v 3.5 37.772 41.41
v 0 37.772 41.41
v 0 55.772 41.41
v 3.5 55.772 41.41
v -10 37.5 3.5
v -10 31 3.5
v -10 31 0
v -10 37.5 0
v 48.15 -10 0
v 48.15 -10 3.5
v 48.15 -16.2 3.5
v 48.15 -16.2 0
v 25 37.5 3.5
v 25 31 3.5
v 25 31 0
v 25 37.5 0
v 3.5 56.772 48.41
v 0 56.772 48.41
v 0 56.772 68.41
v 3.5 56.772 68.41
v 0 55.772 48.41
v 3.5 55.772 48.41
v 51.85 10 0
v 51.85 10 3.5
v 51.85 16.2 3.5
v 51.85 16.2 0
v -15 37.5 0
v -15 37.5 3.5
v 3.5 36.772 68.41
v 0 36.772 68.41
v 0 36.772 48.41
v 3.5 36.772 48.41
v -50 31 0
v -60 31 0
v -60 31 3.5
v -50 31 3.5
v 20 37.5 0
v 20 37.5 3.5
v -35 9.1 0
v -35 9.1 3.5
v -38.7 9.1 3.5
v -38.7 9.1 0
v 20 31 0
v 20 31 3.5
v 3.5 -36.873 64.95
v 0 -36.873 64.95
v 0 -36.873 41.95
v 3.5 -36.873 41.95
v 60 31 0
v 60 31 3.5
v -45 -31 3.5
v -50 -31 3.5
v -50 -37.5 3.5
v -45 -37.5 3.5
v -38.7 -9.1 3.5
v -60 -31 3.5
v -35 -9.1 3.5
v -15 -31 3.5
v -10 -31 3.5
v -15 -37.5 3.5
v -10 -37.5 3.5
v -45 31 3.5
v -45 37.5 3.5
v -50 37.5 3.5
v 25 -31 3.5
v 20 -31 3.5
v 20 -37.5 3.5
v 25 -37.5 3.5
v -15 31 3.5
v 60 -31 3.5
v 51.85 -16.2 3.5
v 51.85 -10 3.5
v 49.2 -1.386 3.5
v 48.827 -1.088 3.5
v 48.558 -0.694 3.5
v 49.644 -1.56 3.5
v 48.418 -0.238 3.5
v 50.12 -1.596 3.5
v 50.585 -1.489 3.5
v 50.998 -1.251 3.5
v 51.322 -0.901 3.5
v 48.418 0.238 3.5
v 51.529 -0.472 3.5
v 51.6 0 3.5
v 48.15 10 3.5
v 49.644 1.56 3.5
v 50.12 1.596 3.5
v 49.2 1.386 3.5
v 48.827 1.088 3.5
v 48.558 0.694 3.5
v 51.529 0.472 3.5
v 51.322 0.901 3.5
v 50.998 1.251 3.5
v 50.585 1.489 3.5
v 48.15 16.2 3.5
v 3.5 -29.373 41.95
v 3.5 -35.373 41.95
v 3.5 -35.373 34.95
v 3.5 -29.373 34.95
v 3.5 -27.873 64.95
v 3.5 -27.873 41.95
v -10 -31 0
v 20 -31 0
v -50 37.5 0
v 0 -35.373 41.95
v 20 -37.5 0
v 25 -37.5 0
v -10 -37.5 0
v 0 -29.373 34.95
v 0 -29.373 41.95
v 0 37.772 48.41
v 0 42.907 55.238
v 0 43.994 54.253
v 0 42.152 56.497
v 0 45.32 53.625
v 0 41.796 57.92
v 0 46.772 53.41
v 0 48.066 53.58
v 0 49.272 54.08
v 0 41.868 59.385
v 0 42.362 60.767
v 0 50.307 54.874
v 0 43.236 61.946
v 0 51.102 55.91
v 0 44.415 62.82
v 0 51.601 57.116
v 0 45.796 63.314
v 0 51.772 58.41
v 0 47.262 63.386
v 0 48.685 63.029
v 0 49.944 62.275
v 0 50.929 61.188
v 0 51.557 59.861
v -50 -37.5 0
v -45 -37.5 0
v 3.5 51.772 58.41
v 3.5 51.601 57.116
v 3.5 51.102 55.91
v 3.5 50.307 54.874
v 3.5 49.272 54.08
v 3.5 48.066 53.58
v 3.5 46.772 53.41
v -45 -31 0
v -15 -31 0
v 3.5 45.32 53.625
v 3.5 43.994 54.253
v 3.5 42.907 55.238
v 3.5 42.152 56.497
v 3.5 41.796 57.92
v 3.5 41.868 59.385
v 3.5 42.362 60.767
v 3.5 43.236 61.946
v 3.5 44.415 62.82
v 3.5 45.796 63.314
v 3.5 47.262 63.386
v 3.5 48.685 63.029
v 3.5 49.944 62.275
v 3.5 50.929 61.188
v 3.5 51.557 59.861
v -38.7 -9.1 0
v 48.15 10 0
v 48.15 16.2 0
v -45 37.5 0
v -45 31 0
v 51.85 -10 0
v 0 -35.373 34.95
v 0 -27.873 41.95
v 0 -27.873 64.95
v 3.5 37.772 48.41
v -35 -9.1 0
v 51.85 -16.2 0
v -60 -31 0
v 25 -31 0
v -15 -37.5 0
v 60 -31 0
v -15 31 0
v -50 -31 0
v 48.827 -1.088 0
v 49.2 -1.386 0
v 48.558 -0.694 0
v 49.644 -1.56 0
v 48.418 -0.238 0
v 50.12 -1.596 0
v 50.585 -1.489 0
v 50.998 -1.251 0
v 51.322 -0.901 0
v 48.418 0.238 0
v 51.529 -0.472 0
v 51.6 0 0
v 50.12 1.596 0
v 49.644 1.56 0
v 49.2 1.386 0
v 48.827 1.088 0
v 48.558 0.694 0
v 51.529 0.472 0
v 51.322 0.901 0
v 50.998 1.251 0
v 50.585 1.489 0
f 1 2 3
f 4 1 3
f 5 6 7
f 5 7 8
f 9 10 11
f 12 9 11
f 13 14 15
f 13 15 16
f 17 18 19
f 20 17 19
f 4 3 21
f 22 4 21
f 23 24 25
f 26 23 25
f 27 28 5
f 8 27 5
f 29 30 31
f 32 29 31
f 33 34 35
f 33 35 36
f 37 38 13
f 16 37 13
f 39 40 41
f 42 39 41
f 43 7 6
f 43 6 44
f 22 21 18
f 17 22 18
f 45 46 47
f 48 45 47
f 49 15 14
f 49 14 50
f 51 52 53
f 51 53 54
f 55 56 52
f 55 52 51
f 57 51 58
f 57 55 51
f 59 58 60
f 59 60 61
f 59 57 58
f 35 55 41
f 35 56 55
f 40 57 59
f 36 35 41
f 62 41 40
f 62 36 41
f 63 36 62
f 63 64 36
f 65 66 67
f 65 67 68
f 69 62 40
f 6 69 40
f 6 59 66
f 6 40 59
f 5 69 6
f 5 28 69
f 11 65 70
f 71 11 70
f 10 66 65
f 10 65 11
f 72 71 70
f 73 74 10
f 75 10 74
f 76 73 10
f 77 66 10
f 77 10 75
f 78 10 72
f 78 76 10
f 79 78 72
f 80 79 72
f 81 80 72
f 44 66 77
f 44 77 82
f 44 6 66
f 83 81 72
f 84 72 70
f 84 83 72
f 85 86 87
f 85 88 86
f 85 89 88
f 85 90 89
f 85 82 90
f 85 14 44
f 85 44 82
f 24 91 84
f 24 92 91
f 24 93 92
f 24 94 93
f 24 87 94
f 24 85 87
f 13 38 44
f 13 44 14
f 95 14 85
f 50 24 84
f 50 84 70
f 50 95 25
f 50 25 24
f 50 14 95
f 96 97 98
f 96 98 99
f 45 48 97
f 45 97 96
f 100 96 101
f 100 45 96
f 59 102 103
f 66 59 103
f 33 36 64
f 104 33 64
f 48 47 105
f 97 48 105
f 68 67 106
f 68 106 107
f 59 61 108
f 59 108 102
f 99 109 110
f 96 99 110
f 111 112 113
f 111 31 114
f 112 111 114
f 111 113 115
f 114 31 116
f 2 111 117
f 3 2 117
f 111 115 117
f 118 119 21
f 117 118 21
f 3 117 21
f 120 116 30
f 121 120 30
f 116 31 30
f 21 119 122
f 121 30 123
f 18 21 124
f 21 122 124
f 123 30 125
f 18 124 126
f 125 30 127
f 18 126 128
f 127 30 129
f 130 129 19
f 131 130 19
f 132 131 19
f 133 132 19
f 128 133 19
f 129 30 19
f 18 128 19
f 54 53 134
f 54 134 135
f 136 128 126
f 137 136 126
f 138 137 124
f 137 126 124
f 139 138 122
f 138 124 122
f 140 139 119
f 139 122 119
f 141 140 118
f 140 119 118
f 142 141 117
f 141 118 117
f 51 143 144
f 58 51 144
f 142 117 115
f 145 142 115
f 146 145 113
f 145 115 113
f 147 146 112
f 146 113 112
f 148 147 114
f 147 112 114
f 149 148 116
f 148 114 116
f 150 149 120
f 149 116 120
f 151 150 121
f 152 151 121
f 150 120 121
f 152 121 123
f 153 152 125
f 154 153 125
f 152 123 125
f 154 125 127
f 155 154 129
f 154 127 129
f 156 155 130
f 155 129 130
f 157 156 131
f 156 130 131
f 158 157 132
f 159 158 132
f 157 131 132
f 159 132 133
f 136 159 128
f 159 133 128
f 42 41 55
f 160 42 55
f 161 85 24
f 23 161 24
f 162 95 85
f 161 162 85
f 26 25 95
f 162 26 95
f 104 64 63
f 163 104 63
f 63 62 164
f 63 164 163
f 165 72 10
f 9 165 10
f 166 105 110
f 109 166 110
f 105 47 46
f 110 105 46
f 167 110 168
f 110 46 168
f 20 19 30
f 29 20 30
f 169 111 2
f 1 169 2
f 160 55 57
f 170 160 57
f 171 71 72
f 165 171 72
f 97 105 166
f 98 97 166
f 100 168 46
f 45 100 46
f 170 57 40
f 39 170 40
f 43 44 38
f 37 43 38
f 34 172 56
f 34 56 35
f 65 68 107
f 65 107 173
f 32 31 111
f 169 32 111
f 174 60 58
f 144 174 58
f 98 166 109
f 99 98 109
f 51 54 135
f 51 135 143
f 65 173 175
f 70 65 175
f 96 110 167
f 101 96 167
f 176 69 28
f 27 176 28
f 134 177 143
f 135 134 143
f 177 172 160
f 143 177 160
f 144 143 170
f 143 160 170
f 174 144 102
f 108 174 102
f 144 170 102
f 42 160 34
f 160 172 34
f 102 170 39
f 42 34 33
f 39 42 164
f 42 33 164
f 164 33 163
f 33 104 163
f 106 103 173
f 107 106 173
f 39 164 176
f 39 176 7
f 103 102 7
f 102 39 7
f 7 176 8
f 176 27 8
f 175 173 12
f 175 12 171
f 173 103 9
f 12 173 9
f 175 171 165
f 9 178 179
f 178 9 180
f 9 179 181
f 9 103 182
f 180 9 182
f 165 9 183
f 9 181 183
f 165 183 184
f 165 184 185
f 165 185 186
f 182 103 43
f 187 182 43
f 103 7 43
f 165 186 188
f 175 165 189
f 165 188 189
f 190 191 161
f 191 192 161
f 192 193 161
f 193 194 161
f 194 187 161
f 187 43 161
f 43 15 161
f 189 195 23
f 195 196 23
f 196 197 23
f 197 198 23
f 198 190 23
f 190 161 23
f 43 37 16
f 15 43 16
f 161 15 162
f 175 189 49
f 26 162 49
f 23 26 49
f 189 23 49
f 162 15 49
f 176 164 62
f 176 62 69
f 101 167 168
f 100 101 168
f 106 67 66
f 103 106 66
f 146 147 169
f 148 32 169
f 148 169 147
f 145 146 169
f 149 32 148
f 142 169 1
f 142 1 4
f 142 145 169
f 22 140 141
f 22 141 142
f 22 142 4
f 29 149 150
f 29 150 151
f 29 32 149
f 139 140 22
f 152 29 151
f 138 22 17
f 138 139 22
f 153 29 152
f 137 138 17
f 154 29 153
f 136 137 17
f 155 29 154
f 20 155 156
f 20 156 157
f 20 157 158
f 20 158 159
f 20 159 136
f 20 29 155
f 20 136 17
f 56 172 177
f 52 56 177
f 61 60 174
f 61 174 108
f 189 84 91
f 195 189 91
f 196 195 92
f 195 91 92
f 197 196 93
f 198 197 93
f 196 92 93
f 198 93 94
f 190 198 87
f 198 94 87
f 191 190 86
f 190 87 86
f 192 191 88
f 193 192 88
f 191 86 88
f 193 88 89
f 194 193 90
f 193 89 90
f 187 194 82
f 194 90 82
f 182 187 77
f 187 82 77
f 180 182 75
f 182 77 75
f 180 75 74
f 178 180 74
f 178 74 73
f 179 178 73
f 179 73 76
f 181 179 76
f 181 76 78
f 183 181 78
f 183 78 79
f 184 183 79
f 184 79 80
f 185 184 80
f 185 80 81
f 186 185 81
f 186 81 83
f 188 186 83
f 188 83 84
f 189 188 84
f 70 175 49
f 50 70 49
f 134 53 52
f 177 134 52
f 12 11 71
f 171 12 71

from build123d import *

# Parameters (mm, degrees)
F0_W      = 120
F0_H      = 62
F1_DEPTH  = 3.5
F2_W      = 5
F2_H      = 6.5
F3_DEPTH  = 3.5
F4_R      = 1.6
F5_DEPTH  = 3.501
F7_DEPTH  = 3.501
F9_DEPTH  = 3.5
F11_DEPTH = 3.5


with BuildPart() as f1:
    # F0 (on Top) → F1 (new body)
    with BuildSketch(Plane.XY):
        Rectangle(F0_W, F0_H)
    extrude(amount=F1_DEPTH)

    # F2 (on face) → F3 (join)
    with BuildSketch(Plane.XY.offset(3.5)):
        with Locations((-47.5, 34.25)):
            Rectangle(F2_W, F2_H)
        with Locations((-12.5, 34.25)):
            Rectangle(F2_W, F2_H)
        with Locations((22.5, 34.25)):
            Rectangle(F2_W, F2_H)
        with Locations((-47.5, -34.25)):
            Rectangle(F2_W, F2_H)
        with Locations((-12.5, -34.25)):
            Rectangle(F2_W, F2_H)
        with Locations((22.5, -34.25)):
            Rectangle(F2_W, F2_H)
    extrude(amount=-F3_DEPTH)

    # F4 (on face) → F5 (cut, through all)
    with BuildSketch(Plane.XY.offset(3.5)):
        with Locations((50, 0)):
            Circle(F4_R)
    extrude(amount=-F5_DEPTH, mode=Mode.SUBTRACT)

    # F6 (on face) → F7 (cut, through all)
    with BuildSketch(Plane.XY.offset(3.5)):
        Polygon((-35, -9.1), (-35, 0), (-35, 9.1), (-38.7, 9.1), (-38.7, -9.1), align=None)
        Polygon((48.15, 10), (50, 10), (51.85, 10), (51.85, 16.2), (48.15, 16.2), align=None)
        Polygon((51.85, -10), (50, -10), (48.15, -10), (48.15, -16.2), (51.85, -16.2), align=None)
    extrude(amount=-F7_DEPTH, mode=Mode.SUBTRACT)


with BuildPart() as f9:
    # F8 (on Right) → F9 (new body)
    with BuildSketch(Plane.YZ):
        Polygon((-35.3731953984, 41.9501893669), (-35.3731953984, 34.9501893669), (-29.3731953984, 34.9501893669), (-29.3731953984, 41.9501893669), (-27.8731953984, 41.9501893669), (-27.8731953984, 64.9501893669), (-36.8731953984, 64.9501893669), (-36.8731953984, 41.9501893669), align=None)
    extrude(amount=F9_DEPTH)


with BuildPart() as f11:
    # F10 (on Right) → F11 (new body)
    with BuildSketch(Plane.YZ):
        Polygon((37.7718215659, 48.4099896544), (37.7718215659, 41.4099896544), (46.7718215659, 41.4099896544), (55.7718215659, 41.4099896544), (55.7718215659, 48.4099896544), (56.7718215659, 48.4099896544), (56.7718215659, 68.4099896544), (36.7718215659, 68.4099896544), (36.7718215659, 48.4099896544), align=None)
        with BuildLine():
            ThreePointArc((51.7718215659, 58.4099896544), (50.3073554719, 54.8744557485), (46.7718215659, 53.4099896544))
            ThreePointArc((46.7718215659, 53.4099896544), (43.23628766, 61.9455235603), (51.7718215659, 58.4099896544))
        make_face(mode=Mode.SUBTRACT)
    extrude(amount=F11_DEPTH)


solid = Compound([f1.part, f9.part, f11.part])
